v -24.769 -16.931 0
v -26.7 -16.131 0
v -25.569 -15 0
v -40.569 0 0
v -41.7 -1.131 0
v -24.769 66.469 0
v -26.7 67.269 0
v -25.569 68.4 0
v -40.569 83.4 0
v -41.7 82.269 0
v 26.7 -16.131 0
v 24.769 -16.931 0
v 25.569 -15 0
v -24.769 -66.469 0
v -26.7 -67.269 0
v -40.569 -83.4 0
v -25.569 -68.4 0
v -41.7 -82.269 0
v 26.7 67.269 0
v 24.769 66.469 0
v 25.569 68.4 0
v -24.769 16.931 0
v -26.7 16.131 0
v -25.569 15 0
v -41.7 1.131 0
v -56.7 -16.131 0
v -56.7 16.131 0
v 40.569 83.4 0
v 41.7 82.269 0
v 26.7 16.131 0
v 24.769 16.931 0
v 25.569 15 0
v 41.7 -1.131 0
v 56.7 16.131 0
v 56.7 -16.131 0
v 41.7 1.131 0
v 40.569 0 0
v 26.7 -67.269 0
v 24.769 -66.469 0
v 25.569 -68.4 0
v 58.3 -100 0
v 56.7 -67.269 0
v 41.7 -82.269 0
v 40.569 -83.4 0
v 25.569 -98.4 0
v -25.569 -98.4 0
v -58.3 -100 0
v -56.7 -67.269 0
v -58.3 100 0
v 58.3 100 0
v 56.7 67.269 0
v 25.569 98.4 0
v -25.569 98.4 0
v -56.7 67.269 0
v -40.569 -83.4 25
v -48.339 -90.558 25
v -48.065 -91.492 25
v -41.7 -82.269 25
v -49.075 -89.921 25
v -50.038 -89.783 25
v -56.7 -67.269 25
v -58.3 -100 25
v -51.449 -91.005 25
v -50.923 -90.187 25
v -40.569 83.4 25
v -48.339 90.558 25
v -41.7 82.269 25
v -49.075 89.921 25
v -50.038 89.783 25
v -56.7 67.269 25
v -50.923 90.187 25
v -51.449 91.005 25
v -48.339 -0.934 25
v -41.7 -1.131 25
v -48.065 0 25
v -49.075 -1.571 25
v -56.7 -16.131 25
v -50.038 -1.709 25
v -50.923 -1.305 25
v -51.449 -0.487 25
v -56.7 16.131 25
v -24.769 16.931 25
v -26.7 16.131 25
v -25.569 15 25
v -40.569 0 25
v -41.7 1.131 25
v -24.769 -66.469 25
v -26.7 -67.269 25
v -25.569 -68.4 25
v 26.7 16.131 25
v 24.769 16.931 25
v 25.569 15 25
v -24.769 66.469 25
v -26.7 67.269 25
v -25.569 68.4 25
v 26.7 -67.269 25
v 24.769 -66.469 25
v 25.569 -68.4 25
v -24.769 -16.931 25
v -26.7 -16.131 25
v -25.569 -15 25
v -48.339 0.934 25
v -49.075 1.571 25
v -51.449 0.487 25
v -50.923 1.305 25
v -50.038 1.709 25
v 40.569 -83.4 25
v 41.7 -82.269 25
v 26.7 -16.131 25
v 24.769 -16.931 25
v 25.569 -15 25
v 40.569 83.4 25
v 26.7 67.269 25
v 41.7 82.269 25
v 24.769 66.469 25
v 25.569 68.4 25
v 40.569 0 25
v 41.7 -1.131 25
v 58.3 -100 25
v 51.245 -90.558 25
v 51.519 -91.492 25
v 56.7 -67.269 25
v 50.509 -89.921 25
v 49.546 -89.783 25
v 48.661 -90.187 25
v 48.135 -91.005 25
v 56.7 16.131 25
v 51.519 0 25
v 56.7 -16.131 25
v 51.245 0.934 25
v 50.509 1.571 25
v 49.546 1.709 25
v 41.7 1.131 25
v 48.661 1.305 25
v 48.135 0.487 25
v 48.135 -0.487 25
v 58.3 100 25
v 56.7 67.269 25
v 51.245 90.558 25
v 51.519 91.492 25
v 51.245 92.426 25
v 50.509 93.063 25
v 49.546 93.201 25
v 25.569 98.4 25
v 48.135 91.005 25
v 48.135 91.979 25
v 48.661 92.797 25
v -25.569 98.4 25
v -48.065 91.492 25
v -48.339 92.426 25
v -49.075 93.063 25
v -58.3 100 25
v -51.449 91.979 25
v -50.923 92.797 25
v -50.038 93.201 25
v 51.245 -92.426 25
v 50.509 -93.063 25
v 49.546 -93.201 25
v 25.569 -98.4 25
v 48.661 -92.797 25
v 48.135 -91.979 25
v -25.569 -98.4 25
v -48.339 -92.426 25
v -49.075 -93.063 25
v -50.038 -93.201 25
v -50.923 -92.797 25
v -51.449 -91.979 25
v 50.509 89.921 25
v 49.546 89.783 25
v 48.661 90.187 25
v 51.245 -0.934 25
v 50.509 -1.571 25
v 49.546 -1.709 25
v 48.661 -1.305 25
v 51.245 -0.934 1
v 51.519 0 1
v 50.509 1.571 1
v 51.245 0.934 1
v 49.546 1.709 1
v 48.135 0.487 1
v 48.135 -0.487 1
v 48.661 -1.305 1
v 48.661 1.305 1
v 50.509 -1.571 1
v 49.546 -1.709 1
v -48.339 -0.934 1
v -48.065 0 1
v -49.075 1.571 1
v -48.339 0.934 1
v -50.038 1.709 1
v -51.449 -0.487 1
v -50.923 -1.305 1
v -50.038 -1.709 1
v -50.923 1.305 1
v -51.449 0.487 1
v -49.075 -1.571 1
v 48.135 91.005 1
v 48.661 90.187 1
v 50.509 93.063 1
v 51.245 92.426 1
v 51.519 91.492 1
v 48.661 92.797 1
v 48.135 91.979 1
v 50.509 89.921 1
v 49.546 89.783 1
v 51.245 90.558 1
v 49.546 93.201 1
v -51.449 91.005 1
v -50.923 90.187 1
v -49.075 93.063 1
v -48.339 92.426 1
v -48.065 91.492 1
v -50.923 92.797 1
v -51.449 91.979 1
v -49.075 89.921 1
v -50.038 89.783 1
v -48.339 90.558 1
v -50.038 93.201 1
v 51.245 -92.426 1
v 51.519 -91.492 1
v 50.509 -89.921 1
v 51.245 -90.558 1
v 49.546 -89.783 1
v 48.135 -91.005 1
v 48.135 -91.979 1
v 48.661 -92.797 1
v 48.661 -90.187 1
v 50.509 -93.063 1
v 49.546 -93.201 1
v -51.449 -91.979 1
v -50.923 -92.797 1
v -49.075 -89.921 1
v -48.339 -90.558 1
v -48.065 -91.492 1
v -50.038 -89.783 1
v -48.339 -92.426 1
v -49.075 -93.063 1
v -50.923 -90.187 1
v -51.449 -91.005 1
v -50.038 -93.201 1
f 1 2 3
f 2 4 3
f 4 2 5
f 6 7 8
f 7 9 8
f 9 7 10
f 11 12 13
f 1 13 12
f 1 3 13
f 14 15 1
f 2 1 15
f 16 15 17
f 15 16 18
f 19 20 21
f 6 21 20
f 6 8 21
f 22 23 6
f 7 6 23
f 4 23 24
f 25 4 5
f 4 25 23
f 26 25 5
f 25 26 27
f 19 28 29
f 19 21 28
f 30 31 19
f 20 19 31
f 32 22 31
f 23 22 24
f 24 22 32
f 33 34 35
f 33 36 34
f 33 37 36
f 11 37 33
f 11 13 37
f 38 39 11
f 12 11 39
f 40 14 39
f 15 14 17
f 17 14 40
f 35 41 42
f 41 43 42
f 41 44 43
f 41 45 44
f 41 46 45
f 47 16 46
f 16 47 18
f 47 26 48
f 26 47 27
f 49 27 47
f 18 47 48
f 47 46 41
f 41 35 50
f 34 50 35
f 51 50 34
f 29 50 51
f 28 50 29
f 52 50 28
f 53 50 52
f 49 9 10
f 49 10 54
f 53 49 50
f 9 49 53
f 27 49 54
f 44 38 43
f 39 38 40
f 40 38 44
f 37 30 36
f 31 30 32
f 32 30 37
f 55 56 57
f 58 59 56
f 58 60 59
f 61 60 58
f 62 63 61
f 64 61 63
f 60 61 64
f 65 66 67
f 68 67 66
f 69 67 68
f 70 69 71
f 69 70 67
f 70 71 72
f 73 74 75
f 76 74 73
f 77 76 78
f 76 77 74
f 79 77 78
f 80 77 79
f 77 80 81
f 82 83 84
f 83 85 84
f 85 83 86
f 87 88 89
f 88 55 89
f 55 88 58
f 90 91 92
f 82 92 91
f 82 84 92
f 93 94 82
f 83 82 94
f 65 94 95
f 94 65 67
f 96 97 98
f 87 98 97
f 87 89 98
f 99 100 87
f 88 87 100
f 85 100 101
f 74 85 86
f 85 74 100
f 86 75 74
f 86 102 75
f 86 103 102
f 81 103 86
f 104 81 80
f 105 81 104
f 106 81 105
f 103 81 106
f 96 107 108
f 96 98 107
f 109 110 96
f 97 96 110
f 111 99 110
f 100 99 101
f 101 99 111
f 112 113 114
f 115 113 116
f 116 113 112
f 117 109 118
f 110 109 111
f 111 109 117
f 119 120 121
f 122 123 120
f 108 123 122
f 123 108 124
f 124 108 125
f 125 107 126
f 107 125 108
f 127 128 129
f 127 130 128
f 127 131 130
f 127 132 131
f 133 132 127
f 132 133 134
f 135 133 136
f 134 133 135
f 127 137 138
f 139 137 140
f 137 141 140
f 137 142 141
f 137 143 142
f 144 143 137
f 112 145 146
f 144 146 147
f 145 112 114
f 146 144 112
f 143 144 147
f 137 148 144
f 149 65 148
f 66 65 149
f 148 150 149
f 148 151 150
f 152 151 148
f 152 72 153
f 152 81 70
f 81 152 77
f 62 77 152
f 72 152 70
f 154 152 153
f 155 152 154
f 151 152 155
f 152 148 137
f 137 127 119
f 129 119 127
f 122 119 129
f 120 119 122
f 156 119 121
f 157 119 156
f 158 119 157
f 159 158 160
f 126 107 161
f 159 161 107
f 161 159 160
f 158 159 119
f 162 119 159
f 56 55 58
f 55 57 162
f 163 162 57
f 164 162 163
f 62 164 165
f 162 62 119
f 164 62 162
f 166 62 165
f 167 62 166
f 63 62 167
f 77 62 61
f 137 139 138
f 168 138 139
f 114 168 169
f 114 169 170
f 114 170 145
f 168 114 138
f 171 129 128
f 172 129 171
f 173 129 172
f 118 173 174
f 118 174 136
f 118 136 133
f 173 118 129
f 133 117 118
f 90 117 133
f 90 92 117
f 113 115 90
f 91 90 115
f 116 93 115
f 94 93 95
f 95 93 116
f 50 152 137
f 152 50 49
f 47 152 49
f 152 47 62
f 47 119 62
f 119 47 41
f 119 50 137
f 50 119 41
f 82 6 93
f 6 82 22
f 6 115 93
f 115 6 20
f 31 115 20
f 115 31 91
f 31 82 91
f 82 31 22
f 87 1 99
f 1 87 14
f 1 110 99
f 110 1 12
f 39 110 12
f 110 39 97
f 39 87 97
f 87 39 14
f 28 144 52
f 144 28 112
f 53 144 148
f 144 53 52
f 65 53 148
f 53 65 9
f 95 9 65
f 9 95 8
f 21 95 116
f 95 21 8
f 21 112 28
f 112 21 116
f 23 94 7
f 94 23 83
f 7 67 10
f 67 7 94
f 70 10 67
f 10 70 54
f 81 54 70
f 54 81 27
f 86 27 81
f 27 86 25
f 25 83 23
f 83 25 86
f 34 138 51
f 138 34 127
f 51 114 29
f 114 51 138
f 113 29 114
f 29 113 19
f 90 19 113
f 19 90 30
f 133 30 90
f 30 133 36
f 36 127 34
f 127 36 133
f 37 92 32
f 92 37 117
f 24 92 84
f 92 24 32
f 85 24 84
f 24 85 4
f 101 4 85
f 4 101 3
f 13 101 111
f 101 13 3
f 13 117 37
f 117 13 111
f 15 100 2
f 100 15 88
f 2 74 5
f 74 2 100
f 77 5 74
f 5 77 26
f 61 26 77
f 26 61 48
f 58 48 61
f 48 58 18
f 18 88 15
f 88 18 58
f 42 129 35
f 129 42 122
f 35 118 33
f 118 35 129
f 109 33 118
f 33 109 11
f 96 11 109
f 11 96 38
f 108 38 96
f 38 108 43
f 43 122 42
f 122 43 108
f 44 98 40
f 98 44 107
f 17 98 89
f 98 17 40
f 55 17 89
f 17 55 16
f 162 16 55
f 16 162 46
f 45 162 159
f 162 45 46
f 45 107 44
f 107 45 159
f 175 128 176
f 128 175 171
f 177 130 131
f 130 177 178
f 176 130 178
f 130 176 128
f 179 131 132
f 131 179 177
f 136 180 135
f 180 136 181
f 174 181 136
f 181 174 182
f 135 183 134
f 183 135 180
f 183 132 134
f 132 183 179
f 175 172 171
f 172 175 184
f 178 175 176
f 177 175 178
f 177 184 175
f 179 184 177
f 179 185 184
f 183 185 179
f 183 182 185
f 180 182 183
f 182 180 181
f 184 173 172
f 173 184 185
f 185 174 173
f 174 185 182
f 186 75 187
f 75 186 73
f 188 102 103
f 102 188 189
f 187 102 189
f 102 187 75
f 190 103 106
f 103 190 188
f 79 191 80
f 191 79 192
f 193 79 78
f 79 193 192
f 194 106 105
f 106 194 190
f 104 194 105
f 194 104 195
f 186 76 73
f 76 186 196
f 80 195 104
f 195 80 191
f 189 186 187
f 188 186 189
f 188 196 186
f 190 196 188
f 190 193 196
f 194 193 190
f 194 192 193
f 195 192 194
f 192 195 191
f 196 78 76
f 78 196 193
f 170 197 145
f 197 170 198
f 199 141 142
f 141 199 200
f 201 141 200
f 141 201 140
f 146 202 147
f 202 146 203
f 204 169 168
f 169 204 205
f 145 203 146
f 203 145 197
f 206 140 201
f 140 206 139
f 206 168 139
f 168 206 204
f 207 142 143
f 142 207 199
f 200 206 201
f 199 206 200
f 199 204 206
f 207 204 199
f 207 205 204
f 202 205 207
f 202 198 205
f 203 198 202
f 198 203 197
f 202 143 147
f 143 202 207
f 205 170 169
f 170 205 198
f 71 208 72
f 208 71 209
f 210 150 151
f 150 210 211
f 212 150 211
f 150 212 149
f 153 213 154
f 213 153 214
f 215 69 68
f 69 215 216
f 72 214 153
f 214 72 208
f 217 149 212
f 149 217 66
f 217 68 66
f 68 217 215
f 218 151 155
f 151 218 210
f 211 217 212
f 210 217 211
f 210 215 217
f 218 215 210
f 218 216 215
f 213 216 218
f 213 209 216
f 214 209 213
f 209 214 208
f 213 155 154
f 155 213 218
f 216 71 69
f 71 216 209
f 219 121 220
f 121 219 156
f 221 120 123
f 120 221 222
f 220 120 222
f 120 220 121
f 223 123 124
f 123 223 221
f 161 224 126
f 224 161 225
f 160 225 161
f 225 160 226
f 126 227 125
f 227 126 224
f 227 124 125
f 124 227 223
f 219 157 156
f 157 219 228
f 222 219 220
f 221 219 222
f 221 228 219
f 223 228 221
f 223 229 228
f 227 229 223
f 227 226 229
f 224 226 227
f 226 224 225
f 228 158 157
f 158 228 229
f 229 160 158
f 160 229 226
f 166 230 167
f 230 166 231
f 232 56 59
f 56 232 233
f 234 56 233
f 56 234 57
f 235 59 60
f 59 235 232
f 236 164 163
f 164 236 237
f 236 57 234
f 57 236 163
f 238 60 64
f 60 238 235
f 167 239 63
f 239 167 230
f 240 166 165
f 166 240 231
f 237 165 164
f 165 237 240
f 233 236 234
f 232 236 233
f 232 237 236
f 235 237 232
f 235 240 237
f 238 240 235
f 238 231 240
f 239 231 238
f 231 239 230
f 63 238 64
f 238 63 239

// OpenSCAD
// Character Height.  Default = 7".  Includes wall thickness (below) in this measurement.  But does not include screws, if you mount them at the top/bottom edges.
char_height = 200;

// Wall Thickness in mm
wall_thickness = 1.6;

// Which part would you like to see?
part = "DigitCase"; // [DigitParts:Diffused 'Lenses' and Case,DigitCase:Case Only,DigitLens:Diffused Segments Only]

// *Percent* of char_height that the segment's width will be.
segment_width = 15; //[5:30]

// How thick (from the mounting surface) should the case be?
char_thick = 25;

// How thick should the lens layer be? (mm)
diff_thick = 1.2;

// What is the Tap Drill size of the screws you will mount with?  (mm)
tap_hole_size = 3.454;

// Do you want the centers of the 8 removed?
cutouts = true;   // [true,false]

// should the case follow the edge of the segments?
chamfer = false;  // [true,false]

// do you want mounting holes?
mounting_holes = true; // [true,false]

// Where would you like the holes placed?
mounting_type = "corners";  // [topbottom,corners,centersides,insides]

// Do you want the digit to expand the case size?
expand_case = true; // [true,false]


segwidth = char_height * segment_width / 100;
walltriangle = sqrt( pow(wall_thickness,2) / 2);
segheight = (char_height - wall_thickness * 2 - segwidth - walltriangle * 4) / 2;
segriser = segheight - segwidth;
case_x_out = segheight/2 + segwidth/2 + walltriangle + wall_thickness;
case_y_out = segheight + segwidth/2 + walltriangle*2 + wall_thickness;


print_part();

module print_part(){
    if(part == "DigitParts"){
        diffuse_segments();
        case();
    } else if (part == "DigitCase"){
        if (mounting_holes == true){
            if(mounting_type == "centersides"){
                case();
                sidetabs();
            }
            if(mounting_type == "corners"){
                difference(){
                    case();
                    cornertaps();
                }
            }
        }
    } else if (part == "DigitLens"){
        diffuse_segments();
    }
    
            
    
}

module sidetabs(){
    difference(){
        translate([0,0,char_thick-wall_thickness]){
            linear_extrude(height=wall_thickness){
                polygon([[segheight/2,0],
                    [case_x_out, -segwidth/2-wall_thickness],
                    [case_x_out, segwidth/2+wall_thickness]]);
                polygon([[-segheight/2, 0],
                    [-case_x_out, -segwidth/2 -wall_thickness],
                    [-case_x_out, segwidth/2+wall_thickness]]);
            }
        }
        translate([-segheight/2-segwidth/2+wall_thickness,0,char_thick])
        cylinder(r=tap_hole_size/2,h=1, center=true);
        translate([-segheight/2-segwidth/2+wall_thickness,0,char_thick])
        cylinder(r=1,h=1.5, center=true);
        translate([segheight/2+segwidth/2-wall_thickness,0,char_thick])
        cylinder(r=tap_hole_size/2,h=1, center=true);
        translate([segheight/2+segwidth/2-wall_thickness,0,char_thick])
        cylinder(r=1,h=1.5, center=true);
    }
}

module cornertaps(){
    tapx = case_x_out - wall_thickness - tap_hole_size*2;
    tapy = case_y_out - wall_thickness - tap_hole_size*2;
    translate([tapx,0,char_thick/2+1])
    cylinder(r=tap_hole_size/2, h=char_thick, center=true, $fs = 1);
    translate([-tapx,0,char_thick/2+1])
    cylinder(r=tap_hole_size/2, h=char_thick, center=true, $fs = 1);
    translate([tapx,tapy,char_thick/2+1])
    cylinder(r=tap_hole_size/2, h=char_thick, center=true, $fs = 1);
    translate([-tapx,tapy,char_thick/2+1])
    cylinder(r=tap_hole_size/2, h=char_thick, center=true, $fs = 1);
    translate([tapx,-tapy,char_thick/2+1])
    cylinder(r=tap_hole_size/2, h=char_thick, center=true, $fs = 1);
    translate([-tapx,-tapy,char_thick/2+1])
    cylinder(r=tap_hole_size/2, h=char_thick, center=true, $fs = 1);
}

module case(){
    difference(){
        linear_extrude(height = char_thick)
        if (cutouts == true) {
            if (chamfer == true) {
                difference(){
                    chamfered_case();
                    case_cutouts();
                }
            } else {
                difference(){
                    straight_case();
                    case_cutouts();
                }
            }
        } else {
            if (chamfer == true){
                chamfered_case();
            } else {
                straight_case();
            }  
        }
        linear_extrude(height = char_thick*3, center=true)segments_poly();
    }
    
}

module case_cutouts(){
    translate([0,segheight/2+walltriangle,0])square(segheight-segwidth-wall_thickness, center = true);
    translate([0,-segheight/2-walltriangle,0])square(segheight-segwidth-wall_thickness, center = true);
}

module chamfered_case(){
	/* Old polygon - close, but not perfect
	polygon( points = [
	        [-segheight/2-walltriangle*2, 0], 
	        [-case_x_out, segwidth/2],
	        [-case_x_out, segheight-segwidth/2 + walltriangle*2], 
	        [-segheight/2 +segwidth/2 -walltriangle, case_y_out],
	        [segheight/2 - segwidth/2 + walltriangle, case_y_out],
	        [case_x_out, segheight-segwidth/2 + walltriangle*2],
	        [case_x_out, segwidth/2],
	        [segheight/2+walltriangle*2, 0],
	        [case_x_out, -segwidth/2],
	        [case_x_out, -segheight+segwidth/2-walltriangle*2],
	        [segheight/2 - segwidth/2 + walltriangle, -case_y_out],
	        [-segheight/2 + segwidth/2 - walltriangle, -case_y_out],
	        [-case_x_out, -segheight + segwidth/2 - walltriangle*2],
	        [-case_x_out, -segwidth/2]
	    ], paths = [
	        [0,1,2,3,4,5,6,7,8,9,10,11,12,13]
	    ]);
	*/
	offset(r=wall_thickness){
		segments_poly();
	}
}

module straight_case(){
    square([case_x_out*2, case_y_out*2], center = true);
}

module diffuse_segments(){
    linear_extrude(height = diff_thick)segments_poly();
}

module segments_poly(){ // returns polygons!
    translate([-segheight/2-walltriangle,-segheight/2-walltriangle,0])segment();
    translate([-segheight/2-walltriangle,segheight/2+walltriangle,0])segment();
    translate([segheight/2+walltriangle,-segheight/2-walltriangle,0])segment();
    translate([segheight/2+walltriangle,segheight/2+walltriangle,0])segment();
    rotate([0,0,90])segment();
    translate([0,segheight+walltriangle*2,0])rotate([0,0,90])segment();
    translate([0,-segheight-walltriangle*2.,0])rotate([0,0,90])segment();
}

module segment(){  // returns polygon.
    polygon (points = [
            [-segwidth/2, -segriser/2], [-segwidth/2, segriser/2], [0,segheight/2],
            [segwidth/2, segriser/2], [segwidth/2, -segriser/2], [0,-segheight/2]], 
            paths = [[ 0,1,2,3,4,5]]);
}
